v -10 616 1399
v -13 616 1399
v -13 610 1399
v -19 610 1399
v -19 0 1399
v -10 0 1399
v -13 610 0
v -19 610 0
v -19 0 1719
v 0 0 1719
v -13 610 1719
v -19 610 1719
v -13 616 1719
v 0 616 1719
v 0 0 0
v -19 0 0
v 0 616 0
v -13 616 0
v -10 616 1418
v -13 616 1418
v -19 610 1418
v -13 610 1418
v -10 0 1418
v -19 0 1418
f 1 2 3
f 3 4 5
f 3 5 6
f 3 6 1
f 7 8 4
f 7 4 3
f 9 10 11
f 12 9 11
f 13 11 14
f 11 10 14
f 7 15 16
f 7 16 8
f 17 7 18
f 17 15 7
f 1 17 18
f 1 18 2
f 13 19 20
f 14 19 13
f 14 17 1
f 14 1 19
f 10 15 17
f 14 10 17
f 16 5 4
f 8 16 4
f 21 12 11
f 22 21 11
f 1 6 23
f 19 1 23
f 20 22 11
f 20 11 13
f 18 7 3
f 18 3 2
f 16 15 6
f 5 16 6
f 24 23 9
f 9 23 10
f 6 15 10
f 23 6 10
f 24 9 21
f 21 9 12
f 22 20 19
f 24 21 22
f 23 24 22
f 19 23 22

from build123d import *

# Parameters (mm, degrees)
F0_W     = 616
F0_H     = 1719
F1_DEPTH = 19
F2_W     = 6
F2_H     = 6
F3_DEPTH = 1719.001
F4_W     = 9
F4_H     = 19
F5_DEPTH = 616.001


with BuildPart() as f1:
    # F0 (on Right) → F1 (new body)
    with BuildSketch(Plane.YZ):
        with Locations((308, 859.5)):
            Rectangle(F0_W, F0_H)
    extrude(amount=-F1_DEPTH)

    # F2 (on Top) → F3 (cut, through all)
    with BuildSketch(Plane.XY):
        with Locations((-16, 613)):
            Rectangle(F2_W, F2_H)
    extrude(amount=F3_DEPTH, mode=Mode.SUBTRACT)

    # F4 (on Front) → F5 (cut, through all)
    with BuildSketch(Plane.XZ):
        with Locations((-14.5, 1408.5)):
            Rectangle(F4_W, F4_H)
    extrude(amount=-F5_DEPTH, mode=Mode.SUBTRACT)


solid = f1.part
